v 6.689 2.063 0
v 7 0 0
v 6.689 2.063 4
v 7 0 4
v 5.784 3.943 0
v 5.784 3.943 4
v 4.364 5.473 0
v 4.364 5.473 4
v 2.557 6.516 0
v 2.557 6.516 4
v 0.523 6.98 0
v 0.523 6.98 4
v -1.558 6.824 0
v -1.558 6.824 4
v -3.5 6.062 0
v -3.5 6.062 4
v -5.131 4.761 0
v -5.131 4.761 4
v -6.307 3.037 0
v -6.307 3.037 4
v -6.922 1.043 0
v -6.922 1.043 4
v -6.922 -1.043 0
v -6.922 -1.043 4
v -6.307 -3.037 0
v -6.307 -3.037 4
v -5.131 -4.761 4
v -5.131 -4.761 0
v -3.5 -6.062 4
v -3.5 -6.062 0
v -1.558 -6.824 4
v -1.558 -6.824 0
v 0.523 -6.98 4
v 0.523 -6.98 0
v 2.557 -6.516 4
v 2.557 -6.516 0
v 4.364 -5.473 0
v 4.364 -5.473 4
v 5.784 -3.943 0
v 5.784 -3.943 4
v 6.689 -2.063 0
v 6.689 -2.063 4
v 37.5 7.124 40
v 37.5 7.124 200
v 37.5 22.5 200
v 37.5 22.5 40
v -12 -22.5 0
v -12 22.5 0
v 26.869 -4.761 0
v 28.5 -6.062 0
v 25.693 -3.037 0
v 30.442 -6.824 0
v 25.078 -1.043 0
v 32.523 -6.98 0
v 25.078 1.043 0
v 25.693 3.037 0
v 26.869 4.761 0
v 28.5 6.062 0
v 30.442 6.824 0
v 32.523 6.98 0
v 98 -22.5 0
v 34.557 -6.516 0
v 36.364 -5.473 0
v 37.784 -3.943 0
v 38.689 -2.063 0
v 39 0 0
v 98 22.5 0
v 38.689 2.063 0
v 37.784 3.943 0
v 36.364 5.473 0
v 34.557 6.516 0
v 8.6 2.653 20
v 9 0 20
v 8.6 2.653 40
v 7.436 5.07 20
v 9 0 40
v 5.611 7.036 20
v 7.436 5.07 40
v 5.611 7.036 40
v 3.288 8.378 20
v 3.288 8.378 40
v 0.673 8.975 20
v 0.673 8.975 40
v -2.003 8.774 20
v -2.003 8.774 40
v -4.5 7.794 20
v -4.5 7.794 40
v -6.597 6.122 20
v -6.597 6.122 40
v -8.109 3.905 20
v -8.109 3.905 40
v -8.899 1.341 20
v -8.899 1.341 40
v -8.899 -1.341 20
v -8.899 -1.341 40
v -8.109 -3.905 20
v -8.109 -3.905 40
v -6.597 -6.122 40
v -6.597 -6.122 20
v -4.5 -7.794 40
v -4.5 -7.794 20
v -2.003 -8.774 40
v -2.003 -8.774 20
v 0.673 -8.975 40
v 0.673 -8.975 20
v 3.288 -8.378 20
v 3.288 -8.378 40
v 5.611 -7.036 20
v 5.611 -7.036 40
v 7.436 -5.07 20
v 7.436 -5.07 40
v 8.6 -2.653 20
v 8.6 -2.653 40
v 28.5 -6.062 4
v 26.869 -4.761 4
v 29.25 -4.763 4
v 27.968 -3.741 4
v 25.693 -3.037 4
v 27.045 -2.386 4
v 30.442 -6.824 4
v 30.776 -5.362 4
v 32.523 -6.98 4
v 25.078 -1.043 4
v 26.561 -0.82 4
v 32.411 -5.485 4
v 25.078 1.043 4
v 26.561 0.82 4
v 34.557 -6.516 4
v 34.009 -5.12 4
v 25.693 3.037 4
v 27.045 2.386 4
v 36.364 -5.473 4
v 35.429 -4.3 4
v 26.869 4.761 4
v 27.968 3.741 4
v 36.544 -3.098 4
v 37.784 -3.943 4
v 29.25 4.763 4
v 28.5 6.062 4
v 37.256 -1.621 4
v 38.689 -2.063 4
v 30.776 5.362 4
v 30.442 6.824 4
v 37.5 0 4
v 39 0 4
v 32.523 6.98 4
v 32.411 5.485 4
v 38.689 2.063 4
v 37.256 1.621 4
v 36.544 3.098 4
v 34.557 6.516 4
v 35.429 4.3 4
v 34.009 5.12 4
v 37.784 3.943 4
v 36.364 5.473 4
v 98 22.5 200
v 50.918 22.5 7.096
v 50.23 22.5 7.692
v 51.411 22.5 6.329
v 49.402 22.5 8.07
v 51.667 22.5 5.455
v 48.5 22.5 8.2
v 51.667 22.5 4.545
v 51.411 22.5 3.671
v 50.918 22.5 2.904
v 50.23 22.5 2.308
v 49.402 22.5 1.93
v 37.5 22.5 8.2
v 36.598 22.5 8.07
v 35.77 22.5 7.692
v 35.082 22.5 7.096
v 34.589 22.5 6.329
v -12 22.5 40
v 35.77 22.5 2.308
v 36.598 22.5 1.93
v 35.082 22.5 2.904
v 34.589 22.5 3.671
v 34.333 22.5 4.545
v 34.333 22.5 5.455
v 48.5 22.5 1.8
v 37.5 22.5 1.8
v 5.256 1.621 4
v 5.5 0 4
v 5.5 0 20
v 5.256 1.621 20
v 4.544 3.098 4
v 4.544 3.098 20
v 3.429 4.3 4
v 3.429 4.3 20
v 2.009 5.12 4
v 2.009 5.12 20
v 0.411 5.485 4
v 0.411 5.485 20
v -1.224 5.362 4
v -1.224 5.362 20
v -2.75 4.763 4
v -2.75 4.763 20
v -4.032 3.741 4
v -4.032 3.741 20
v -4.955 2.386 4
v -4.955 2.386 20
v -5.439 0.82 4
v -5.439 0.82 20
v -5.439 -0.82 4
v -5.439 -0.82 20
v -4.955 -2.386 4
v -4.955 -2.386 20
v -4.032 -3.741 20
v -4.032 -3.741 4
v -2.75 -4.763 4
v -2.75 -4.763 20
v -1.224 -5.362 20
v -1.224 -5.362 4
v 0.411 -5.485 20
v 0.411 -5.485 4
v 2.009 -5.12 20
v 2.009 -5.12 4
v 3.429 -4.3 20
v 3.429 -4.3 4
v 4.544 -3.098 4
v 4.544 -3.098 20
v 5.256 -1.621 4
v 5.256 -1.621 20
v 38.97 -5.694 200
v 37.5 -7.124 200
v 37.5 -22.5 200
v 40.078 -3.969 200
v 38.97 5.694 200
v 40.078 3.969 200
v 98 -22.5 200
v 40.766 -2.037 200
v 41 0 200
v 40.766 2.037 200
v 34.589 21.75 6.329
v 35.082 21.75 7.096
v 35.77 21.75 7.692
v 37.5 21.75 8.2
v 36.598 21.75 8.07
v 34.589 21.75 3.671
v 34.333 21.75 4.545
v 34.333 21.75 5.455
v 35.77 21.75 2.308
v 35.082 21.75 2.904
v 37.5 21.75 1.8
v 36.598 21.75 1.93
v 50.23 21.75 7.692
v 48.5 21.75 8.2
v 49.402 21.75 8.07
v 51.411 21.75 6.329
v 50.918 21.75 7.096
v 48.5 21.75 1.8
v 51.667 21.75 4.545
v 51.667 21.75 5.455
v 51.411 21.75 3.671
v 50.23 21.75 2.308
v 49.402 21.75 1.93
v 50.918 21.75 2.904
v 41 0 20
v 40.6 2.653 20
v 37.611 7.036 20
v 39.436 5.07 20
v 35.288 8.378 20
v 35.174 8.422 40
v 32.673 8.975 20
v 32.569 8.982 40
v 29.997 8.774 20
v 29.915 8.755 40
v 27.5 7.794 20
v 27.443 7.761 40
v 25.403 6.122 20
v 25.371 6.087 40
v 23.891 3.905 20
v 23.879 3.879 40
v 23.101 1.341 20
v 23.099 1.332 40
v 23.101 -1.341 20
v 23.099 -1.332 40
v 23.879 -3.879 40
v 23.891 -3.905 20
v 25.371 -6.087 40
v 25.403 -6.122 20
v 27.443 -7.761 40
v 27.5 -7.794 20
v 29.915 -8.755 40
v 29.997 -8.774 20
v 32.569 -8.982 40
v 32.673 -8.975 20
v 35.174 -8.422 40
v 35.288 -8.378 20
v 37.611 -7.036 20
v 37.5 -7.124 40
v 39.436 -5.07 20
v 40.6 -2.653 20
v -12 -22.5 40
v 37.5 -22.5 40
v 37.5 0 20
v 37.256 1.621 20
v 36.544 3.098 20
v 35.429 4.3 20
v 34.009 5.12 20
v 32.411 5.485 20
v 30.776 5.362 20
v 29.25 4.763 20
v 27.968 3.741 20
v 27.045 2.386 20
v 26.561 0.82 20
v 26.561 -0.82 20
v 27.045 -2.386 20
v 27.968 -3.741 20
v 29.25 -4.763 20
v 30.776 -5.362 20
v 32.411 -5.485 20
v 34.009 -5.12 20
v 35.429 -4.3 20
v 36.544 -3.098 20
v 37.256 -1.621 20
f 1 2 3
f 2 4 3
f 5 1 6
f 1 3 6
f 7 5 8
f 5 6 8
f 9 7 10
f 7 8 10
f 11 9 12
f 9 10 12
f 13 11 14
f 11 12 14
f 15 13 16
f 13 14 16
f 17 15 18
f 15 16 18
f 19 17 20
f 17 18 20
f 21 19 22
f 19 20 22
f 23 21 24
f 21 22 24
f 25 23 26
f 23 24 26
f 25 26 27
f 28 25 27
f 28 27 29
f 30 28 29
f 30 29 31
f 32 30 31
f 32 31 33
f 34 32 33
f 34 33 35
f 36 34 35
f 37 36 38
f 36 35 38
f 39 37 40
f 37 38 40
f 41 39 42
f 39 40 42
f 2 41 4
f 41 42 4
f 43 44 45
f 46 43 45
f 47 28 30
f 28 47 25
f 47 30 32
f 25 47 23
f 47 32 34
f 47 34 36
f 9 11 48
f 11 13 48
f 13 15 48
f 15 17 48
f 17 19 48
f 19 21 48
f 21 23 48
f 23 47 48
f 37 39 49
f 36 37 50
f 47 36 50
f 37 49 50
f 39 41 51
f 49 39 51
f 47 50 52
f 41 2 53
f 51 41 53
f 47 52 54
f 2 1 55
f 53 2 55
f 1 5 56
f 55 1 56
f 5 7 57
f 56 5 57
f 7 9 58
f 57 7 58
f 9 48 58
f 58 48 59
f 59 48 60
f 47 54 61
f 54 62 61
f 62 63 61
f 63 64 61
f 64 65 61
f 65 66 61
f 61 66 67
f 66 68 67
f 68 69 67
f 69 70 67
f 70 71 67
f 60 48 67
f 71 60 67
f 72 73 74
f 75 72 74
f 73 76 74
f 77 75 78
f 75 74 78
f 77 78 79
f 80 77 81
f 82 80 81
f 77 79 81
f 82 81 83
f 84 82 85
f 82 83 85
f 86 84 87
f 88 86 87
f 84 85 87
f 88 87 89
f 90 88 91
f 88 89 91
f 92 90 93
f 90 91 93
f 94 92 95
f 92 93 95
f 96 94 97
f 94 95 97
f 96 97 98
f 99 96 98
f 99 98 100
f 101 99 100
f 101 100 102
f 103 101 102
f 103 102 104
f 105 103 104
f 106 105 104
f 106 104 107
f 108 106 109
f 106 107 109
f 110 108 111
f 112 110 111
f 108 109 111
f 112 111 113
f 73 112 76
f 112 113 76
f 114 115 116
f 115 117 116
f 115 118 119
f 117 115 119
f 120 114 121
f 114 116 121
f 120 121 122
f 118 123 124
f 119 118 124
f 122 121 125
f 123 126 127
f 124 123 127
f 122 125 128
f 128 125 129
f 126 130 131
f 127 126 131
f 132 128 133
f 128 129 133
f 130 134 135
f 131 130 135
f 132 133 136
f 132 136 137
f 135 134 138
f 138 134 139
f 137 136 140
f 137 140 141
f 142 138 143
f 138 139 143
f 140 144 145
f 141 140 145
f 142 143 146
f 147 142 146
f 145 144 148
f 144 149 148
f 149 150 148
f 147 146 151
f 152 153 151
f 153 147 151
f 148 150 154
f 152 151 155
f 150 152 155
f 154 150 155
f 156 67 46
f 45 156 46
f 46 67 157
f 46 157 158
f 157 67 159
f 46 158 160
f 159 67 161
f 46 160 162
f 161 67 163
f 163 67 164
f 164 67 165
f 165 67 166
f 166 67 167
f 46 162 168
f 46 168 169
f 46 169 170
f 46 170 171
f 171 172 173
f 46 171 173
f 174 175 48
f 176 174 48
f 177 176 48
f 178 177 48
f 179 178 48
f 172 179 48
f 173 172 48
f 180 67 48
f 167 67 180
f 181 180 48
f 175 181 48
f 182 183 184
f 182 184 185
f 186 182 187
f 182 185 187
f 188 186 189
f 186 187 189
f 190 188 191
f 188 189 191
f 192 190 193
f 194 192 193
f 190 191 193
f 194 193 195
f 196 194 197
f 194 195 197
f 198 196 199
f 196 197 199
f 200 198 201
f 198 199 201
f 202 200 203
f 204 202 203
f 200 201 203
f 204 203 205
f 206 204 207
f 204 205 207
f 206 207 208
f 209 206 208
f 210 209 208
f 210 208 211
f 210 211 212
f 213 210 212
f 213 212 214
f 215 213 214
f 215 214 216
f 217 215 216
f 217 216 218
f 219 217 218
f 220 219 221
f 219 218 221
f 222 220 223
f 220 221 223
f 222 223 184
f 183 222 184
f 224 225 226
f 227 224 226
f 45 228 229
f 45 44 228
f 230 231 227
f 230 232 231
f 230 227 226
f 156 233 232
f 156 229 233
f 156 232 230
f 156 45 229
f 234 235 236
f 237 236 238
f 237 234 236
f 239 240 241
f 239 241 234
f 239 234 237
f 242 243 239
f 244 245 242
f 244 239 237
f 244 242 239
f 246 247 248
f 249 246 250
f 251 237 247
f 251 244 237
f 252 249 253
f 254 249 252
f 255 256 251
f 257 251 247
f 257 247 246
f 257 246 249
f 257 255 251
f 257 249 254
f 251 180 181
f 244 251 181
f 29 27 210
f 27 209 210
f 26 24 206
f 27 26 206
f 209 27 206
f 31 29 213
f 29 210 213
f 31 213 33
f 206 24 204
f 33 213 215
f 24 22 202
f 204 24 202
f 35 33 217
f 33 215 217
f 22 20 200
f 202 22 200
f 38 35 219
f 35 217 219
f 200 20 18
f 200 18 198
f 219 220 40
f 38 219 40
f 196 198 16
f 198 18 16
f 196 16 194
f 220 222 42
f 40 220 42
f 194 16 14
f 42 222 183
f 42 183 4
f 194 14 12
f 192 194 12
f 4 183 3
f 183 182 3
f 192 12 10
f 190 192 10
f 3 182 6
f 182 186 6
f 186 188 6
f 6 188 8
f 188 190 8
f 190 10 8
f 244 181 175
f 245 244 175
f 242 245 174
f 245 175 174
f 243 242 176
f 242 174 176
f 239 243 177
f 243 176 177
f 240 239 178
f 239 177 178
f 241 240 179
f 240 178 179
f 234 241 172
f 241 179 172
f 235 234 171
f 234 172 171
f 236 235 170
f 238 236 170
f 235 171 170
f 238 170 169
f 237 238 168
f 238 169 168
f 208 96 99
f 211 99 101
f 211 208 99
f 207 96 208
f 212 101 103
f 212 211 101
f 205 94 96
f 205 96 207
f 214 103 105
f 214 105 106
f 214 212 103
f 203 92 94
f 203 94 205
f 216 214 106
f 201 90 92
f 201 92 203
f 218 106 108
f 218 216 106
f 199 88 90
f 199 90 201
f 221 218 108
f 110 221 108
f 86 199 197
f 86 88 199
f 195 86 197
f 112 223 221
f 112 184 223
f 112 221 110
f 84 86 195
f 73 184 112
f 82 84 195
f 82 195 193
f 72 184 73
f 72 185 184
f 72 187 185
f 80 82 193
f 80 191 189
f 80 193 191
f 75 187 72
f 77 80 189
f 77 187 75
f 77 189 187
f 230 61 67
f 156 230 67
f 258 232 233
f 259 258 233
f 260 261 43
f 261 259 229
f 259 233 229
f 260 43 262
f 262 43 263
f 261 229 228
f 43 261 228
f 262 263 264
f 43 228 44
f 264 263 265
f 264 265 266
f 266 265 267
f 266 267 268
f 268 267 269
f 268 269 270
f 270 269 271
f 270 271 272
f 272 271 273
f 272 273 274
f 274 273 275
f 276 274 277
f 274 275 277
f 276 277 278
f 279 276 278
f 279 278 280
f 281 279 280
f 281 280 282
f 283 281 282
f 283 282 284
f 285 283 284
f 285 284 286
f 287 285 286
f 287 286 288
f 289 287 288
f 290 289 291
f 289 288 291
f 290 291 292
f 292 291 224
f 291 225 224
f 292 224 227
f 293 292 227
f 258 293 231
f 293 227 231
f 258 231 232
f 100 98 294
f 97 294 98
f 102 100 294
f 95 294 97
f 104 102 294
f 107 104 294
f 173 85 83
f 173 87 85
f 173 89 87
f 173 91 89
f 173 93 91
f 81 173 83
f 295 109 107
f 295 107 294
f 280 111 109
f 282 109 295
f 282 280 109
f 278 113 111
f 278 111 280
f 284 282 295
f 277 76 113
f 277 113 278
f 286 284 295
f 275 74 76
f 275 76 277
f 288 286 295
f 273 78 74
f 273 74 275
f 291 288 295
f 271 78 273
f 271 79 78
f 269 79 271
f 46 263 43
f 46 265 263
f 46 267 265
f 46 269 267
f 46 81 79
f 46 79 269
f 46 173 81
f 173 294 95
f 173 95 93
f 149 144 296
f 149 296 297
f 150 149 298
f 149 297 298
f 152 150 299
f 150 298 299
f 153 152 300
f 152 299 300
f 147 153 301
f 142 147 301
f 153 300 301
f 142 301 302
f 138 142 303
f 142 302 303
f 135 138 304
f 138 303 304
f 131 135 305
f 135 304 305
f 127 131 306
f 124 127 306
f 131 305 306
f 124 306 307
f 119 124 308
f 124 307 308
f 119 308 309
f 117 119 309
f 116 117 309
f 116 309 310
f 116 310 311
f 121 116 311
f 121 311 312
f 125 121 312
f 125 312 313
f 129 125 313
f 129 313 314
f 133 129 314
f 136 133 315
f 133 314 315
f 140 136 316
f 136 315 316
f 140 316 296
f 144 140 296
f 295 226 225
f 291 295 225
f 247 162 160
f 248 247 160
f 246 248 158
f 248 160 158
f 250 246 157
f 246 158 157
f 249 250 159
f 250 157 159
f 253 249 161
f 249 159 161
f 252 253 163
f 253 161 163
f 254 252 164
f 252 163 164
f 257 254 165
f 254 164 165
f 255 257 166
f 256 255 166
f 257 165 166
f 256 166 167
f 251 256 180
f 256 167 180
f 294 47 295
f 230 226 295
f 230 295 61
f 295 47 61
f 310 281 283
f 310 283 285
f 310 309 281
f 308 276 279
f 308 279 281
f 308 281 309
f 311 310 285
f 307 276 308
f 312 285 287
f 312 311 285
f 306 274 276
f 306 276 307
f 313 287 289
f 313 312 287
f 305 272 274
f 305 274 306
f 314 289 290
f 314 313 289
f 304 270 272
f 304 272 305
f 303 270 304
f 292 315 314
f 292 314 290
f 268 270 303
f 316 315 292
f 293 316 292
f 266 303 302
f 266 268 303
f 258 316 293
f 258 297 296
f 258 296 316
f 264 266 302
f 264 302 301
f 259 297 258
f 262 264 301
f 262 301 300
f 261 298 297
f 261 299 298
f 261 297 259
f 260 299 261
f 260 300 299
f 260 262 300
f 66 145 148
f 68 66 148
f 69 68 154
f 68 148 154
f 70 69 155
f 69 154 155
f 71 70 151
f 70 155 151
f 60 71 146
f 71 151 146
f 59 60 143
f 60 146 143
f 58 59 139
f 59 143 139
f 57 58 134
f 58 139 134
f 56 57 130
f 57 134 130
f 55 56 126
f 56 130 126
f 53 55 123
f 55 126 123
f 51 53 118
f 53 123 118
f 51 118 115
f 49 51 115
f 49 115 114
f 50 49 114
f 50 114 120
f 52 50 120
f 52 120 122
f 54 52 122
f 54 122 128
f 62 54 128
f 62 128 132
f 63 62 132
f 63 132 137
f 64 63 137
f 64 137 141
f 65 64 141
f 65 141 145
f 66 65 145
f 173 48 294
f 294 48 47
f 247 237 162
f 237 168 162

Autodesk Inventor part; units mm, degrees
sketch "Sketch_1" plane through (0, 0, 0) normal (0, 0, 1) x (1, 0, 0)
  line L0 (-12, -22.5) -> (98, -22.5)
  line L1 (98, -22.5) -> (98, 22.5)
  line L2 (98, 22.5) -> (-12, 22.5)
  line L3 (-12, 22.5) -> (-12, -22.5)
extrude "Extrusion1" add sketch "Sketch_1" along normal blind 200
sketch "Sketch_2" plane through (0, 0, 0) normal (0, 1, 0) x (-1, 0, 0)
  line L0 (0, 200) -> (0, 0)
  line L1 (0, 0) -> (-7, 0)
  line L2 (-7, 0) -> (-7, 4)
  line L3 (-7, 4) -> (-5.5, 4)
  line L4 (-5.5, 4) -> (-5.5, 20)
  line L5 (-5.5, 20) -> (-9, 20)
  line L6 (-9, 20) -> (-9, 200)
  line L7 (-9, 200) -> (0, 200)
  line L8 (0, 200) -> (0, 0)
revolve "Revolution1" cut sketch "Sketch_2" angle 360 about axis through (0, 0, 200) along (0, 0, 1)
pattern_linear "Rectangular Pattern1" count 2 spacing 32 along (1, 0, 0) of "Revolution1"
sketch "Sketch_8" plane through (0, 0, 200) normal (0, 0, 1) x (1, 0, 0)
  line L0 (-12, -22.5) -> (37.5, -22.5)
  line L1 (37.5, -22.5) -> (37.5, 22.5)
  line L2 (37.5, 22.5) -> (-12, 22.5)
  line L3 (-12, 22.5) -> (-12, -22.5)
extrude "Extrusion2" cut sketch "Sketch_8" against normal blind 160
sketch "Sketch_17" plane through (0, 22.5, 0) normal (0, 1, 0) x (1, 0, 0)
  arc A0 (37.5, -1.8) -> (37.5, -8.2) centre (37.5, -5) ccw
  line L0 (37.5, -8.2) -> (48.5, -8.2)
  arc A1 (48.5, -8.2) -> (48.5, -1.8) centre (48.5, -5) ccw
  line L1 (48.5, -1.8) -> (37.5, -1.8)
extrude "Extrusion3" cut sketch "Sketch_17" against normal blind 0.75
ref_plane "BEF_2_XY" through (32, 0, 0) normal (0, 0, 1) x (1, 0, 0)
ref_plane "BEF_2_YZ" through (32, 0, 0) normal (1, 0, 0) x (0, 1, 0)
ref_plane "BEF_2_ZX" through (32, 0, 0) normal (0, 1, 0) x (0, 0, 1)
ref_plane "IP_ALU_XY" through (43, 21.75, 5) normal (0, -1, 0) x (1, 0, 0)
ref_plane "IP_ALU_YZ" through (43, 21.75, 5) normal (1, 0, 0) x (0, 0, 1)
ref_plane "IP_ALU_ZX" through (43, 21.75, 5) normal (0, 0, 1) x (0, -1, 0)
ref_plane "IP_ALU_3_7_XY" through (44, 21.75, 5) normal (0, -1, 0) x (1, 0, 0)
ref_plane "IP_ALU_3_7_YZ" through (44, 21.75, 5) normal (1, 0, 0) x (0, 0, 1)
ref_plane "IP_ALU_3_7_ZX" through (44, 21.75, 5) normal (0, 0, 1) x (0, -1, 0)
ref_plane "IP_ALU_5_XY" through (44, 21.75, 5) normal (0, -1, 0) x (1, 0, 0)
ref_plane "IP_ALU_5_YZ" through (44, 21.75, 5) normal (1, 0, 0) x (0, 0, 1)
ref_plane "IP_ALU_5_ZX" through (44, 21.75, 5) normal (0, 0, 1) x (0, -1, 0)
ref_plane "IP_GR_XY" through (0, 0, 0) normal (0, 0, 1) x (1, 0, 0)
ref_plane "IP_GR_YZ" through (0, 0, 0) normal (1, 0, 0) x (0, 1, 0)
ref_plane "IP_GR_ZX" through (0, 0, 0) normal (0, 1, 0) x (0, 0, 1)
ref_plane "IP_SCH_1_XY" through (0, 0, 20) normal (0, 0, 1) x (1, 0, 0)
ref_plane "IP_SCH_1_YZ" through (0, 0, 20) normal (1, 0, 0) x (0, 1, 0)
ref_plane "IP_SCH_1_ZX" through (0, 0, 20) normal (0, 1, 0) x (0, 0, 1)
ref_plane "IP_SCH_2_XY" through (32, 0, 20) normal (0, 0, 1) x (1, 0, 0)
ref_plane "IP_SCH_2_YZ" through (32, 0, 20) normal (1, 0, 0) x (0, 1, 0)
ref_plane "IP_SCH_2_ZX" through (32, 0, 20) normal (0, 1, 0) x (0, 0, 1)
properties part number "FGR AL-2-PGN-plus-P 160,PGN-plus-P 160-2-AS-P81110452001216049.51650000000000000000Aluminium6.5"
